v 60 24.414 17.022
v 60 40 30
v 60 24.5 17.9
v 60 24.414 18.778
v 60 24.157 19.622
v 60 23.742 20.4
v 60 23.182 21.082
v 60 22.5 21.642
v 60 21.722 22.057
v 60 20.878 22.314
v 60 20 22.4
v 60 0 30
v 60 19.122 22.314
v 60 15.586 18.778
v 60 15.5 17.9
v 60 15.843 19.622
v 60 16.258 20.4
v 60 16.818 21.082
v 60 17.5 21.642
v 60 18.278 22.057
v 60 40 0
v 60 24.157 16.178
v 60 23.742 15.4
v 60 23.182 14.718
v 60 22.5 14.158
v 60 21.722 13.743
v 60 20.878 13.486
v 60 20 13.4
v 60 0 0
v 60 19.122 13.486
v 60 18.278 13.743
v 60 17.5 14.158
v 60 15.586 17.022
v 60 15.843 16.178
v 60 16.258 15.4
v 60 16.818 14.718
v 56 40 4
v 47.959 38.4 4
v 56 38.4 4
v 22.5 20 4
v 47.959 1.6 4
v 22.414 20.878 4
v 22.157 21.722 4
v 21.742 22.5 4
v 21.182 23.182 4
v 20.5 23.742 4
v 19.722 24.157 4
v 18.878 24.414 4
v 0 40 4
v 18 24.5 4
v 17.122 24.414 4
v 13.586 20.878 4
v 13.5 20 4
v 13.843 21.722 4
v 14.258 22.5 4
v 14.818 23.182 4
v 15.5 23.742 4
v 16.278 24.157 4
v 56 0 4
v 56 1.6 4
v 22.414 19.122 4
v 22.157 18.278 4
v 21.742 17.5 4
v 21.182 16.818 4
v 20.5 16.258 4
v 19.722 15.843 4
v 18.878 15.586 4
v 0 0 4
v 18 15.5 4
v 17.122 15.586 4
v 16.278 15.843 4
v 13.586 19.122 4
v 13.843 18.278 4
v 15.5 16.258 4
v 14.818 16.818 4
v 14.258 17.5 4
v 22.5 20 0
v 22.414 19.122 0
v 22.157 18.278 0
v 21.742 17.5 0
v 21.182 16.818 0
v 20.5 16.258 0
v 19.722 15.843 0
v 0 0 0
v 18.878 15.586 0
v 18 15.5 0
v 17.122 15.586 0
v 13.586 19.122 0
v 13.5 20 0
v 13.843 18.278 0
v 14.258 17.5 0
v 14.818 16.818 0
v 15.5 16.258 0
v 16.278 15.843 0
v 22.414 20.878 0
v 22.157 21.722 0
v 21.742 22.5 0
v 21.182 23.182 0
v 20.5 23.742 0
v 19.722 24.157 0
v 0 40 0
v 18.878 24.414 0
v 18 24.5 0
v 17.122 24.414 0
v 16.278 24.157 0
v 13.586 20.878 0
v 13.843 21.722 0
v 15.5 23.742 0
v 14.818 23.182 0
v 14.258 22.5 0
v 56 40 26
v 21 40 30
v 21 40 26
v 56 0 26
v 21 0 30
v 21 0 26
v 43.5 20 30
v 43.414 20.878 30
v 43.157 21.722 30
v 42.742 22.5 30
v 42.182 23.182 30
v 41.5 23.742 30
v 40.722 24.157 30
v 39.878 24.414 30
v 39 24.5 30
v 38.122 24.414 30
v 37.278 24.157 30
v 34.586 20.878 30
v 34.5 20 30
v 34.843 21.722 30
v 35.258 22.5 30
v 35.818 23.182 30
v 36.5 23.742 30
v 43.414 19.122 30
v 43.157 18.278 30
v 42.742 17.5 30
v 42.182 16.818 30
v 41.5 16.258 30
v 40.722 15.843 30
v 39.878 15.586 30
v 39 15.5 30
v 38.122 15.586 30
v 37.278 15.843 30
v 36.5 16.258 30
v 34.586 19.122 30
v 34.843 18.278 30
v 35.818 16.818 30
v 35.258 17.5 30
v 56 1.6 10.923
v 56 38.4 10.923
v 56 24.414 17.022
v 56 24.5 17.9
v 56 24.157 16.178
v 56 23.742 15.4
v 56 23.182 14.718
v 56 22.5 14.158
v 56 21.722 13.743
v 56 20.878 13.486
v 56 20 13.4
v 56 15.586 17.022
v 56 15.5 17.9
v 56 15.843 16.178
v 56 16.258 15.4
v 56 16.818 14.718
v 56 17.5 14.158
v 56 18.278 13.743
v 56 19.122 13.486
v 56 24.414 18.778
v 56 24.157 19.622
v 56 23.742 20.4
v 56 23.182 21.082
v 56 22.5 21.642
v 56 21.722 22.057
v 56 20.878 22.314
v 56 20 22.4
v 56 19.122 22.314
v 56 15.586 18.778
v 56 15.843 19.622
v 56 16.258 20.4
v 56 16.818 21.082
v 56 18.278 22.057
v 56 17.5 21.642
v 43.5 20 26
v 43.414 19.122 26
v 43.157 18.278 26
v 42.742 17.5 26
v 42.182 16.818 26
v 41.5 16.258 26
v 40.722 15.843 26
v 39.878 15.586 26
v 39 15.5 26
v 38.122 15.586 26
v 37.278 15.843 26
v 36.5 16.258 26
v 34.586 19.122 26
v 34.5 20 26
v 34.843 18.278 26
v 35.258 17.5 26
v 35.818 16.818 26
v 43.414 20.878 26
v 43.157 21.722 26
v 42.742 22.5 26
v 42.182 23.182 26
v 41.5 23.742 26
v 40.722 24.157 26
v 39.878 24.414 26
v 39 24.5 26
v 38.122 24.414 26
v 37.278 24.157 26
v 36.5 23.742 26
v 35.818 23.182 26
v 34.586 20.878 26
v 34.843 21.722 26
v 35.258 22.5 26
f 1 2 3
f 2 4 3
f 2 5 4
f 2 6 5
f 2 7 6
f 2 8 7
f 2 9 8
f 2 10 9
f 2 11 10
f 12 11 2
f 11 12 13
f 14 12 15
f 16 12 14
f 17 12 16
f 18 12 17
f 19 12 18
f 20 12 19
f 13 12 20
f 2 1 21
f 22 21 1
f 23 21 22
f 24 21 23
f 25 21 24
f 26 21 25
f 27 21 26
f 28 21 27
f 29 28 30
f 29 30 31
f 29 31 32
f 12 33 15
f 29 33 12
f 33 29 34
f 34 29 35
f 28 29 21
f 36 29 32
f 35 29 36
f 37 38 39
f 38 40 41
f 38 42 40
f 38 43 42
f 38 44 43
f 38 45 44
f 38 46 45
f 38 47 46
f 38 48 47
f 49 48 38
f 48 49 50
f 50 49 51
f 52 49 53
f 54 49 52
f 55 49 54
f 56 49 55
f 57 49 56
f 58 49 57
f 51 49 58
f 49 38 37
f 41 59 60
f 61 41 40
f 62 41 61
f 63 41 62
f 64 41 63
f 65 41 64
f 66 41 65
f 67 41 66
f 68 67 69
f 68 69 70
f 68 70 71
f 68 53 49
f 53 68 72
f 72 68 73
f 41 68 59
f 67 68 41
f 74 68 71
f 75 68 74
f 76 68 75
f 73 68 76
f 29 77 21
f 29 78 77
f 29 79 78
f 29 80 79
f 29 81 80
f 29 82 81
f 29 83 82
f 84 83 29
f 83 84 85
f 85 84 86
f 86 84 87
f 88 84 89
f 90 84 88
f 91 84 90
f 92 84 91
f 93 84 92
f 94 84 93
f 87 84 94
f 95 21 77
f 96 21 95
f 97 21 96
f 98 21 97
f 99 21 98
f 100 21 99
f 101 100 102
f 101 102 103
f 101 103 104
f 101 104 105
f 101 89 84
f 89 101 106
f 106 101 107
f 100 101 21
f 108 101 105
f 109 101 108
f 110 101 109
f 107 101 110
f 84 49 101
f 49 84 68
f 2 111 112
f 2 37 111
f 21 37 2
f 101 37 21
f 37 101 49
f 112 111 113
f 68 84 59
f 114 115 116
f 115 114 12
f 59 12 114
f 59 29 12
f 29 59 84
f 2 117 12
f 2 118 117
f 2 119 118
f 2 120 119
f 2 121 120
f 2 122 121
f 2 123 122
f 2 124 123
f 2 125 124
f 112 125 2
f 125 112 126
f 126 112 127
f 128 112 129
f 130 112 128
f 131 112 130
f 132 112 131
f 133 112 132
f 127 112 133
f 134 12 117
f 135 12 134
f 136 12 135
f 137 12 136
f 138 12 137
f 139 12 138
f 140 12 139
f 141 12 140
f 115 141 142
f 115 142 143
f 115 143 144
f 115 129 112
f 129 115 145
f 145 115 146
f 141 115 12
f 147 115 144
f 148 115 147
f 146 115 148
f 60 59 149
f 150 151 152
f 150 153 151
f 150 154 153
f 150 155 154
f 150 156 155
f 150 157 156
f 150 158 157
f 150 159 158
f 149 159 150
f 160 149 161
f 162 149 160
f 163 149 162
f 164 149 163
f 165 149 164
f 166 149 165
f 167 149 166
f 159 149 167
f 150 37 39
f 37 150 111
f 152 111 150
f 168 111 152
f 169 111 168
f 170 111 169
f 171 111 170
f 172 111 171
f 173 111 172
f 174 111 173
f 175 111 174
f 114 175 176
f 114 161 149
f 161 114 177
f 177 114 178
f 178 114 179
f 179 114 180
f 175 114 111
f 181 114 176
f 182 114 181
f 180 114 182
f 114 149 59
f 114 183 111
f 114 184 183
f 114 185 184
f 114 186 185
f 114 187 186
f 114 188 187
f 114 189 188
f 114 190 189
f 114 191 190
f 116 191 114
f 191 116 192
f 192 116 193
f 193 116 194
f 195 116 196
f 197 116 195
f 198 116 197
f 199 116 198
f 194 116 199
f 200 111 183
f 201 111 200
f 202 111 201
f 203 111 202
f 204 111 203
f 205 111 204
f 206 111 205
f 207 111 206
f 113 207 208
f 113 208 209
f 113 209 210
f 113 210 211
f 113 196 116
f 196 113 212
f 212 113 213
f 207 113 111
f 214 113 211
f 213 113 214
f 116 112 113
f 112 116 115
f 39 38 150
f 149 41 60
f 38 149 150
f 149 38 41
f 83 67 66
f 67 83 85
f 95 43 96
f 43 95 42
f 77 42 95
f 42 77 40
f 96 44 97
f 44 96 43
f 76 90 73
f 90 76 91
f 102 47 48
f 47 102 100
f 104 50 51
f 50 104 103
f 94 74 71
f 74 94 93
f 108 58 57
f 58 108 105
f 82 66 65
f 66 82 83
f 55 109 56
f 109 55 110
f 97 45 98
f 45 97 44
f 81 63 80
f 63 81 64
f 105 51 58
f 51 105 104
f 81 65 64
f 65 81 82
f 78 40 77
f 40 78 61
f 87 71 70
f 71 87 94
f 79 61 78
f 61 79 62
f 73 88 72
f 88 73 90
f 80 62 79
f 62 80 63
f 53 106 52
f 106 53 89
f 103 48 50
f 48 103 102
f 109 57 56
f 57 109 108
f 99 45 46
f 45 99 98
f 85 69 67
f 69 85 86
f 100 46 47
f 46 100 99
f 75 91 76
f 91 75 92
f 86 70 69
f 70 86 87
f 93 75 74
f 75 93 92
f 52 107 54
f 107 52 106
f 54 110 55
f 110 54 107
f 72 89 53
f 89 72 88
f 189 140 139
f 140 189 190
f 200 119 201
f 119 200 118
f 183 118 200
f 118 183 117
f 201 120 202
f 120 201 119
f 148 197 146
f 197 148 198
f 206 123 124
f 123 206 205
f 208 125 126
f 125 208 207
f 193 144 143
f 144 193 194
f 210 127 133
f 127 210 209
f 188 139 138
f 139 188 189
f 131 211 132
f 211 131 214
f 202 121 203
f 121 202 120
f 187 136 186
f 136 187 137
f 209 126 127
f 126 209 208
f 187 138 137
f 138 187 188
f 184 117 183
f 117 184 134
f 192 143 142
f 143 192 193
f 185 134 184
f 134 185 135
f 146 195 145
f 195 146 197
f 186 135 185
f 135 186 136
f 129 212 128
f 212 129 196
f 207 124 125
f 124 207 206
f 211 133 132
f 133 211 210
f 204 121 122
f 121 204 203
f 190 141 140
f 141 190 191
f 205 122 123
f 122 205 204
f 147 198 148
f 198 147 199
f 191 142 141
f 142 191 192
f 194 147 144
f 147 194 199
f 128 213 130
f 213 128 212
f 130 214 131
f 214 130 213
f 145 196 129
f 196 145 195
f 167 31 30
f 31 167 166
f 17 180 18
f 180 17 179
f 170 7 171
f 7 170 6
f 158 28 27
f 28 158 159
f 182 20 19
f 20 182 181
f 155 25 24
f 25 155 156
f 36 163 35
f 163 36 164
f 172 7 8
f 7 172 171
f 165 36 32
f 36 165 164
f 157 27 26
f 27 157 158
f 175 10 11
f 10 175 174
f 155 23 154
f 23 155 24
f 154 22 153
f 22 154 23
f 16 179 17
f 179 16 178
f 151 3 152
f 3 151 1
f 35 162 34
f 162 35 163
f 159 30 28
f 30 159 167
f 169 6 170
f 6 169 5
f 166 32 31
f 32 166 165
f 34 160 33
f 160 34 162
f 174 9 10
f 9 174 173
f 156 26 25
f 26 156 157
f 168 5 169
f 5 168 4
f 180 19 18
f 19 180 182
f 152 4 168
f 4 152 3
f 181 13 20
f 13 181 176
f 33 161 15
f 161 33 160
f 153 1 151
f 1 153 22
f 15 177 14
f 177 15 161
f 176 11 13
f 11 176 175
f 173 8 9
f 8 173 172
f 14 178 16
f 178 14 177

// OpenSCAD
$fn = 32;

// ----------------------------------------------------------------------
// Z-bracket: 60 x 40 x 30 mm
// ----------------------------------------------------------------------

// --- parameters (mm) ---
foot_len = 60;            // lower foot length, X
top_len = 35;             // upper foot length, X
depth = 40;               // bracket width, Y
step_h = 30;              // overall rise, Z
plate_t = 4;              // plate thickness
hole_d = 9;               // clearance for M8
rib_len = 9.9;            // gusset leg
rib_sink = 1.6;           // gusset overlap into the plates

module hole_z(px, py, z0) {
  translate([px, py, z0 - 2.5]) cylinder(h = plate_t + 5, d = hole_d);
}
module hole_x(py, pz) {
  translate([-2.5, py, pz]) rotate([0, 90, 0]) cylinder(h = plate_t + 5, d = hole_d);
}
module gusset(x0) {
  translate([x0, depth - rib_sink, 0])
    rotate([90, 0, 0])
      linear_extrude(height = depth - 2 * rib_sink)
        polygon(points = [[rib_sink, plate_t - rib_sink],
                          [rib_sink, plate_t - rib_sink + rib_len],
                          [-rib_len, plate_t - rib_sink]]);
}

difference() {
  union() {
    cube([foot_len, depth, plate_t]);
    /* web, overlapping the lower foot */
    translate([foot_len - plate_t, 0, 0]) cube([plate_t, depth, step_h]);
    /* upper foot, sunk into the web */
    translate([foot_len - plate_t - top_len, 0, step_h - plate_t]) cube([top_len + plate_t, depth, plate_t]);
    gusset(foot_len - plate_t);
  }
  hole_z(18, 20, 0);
  translate([foot_len - plate_t - 17, 0, 0]) hole_z(0, 20, step_h - plate_t);
  translate([foot_len - plate_t, 0, 0]) hole_x(20, 17.9);
}
